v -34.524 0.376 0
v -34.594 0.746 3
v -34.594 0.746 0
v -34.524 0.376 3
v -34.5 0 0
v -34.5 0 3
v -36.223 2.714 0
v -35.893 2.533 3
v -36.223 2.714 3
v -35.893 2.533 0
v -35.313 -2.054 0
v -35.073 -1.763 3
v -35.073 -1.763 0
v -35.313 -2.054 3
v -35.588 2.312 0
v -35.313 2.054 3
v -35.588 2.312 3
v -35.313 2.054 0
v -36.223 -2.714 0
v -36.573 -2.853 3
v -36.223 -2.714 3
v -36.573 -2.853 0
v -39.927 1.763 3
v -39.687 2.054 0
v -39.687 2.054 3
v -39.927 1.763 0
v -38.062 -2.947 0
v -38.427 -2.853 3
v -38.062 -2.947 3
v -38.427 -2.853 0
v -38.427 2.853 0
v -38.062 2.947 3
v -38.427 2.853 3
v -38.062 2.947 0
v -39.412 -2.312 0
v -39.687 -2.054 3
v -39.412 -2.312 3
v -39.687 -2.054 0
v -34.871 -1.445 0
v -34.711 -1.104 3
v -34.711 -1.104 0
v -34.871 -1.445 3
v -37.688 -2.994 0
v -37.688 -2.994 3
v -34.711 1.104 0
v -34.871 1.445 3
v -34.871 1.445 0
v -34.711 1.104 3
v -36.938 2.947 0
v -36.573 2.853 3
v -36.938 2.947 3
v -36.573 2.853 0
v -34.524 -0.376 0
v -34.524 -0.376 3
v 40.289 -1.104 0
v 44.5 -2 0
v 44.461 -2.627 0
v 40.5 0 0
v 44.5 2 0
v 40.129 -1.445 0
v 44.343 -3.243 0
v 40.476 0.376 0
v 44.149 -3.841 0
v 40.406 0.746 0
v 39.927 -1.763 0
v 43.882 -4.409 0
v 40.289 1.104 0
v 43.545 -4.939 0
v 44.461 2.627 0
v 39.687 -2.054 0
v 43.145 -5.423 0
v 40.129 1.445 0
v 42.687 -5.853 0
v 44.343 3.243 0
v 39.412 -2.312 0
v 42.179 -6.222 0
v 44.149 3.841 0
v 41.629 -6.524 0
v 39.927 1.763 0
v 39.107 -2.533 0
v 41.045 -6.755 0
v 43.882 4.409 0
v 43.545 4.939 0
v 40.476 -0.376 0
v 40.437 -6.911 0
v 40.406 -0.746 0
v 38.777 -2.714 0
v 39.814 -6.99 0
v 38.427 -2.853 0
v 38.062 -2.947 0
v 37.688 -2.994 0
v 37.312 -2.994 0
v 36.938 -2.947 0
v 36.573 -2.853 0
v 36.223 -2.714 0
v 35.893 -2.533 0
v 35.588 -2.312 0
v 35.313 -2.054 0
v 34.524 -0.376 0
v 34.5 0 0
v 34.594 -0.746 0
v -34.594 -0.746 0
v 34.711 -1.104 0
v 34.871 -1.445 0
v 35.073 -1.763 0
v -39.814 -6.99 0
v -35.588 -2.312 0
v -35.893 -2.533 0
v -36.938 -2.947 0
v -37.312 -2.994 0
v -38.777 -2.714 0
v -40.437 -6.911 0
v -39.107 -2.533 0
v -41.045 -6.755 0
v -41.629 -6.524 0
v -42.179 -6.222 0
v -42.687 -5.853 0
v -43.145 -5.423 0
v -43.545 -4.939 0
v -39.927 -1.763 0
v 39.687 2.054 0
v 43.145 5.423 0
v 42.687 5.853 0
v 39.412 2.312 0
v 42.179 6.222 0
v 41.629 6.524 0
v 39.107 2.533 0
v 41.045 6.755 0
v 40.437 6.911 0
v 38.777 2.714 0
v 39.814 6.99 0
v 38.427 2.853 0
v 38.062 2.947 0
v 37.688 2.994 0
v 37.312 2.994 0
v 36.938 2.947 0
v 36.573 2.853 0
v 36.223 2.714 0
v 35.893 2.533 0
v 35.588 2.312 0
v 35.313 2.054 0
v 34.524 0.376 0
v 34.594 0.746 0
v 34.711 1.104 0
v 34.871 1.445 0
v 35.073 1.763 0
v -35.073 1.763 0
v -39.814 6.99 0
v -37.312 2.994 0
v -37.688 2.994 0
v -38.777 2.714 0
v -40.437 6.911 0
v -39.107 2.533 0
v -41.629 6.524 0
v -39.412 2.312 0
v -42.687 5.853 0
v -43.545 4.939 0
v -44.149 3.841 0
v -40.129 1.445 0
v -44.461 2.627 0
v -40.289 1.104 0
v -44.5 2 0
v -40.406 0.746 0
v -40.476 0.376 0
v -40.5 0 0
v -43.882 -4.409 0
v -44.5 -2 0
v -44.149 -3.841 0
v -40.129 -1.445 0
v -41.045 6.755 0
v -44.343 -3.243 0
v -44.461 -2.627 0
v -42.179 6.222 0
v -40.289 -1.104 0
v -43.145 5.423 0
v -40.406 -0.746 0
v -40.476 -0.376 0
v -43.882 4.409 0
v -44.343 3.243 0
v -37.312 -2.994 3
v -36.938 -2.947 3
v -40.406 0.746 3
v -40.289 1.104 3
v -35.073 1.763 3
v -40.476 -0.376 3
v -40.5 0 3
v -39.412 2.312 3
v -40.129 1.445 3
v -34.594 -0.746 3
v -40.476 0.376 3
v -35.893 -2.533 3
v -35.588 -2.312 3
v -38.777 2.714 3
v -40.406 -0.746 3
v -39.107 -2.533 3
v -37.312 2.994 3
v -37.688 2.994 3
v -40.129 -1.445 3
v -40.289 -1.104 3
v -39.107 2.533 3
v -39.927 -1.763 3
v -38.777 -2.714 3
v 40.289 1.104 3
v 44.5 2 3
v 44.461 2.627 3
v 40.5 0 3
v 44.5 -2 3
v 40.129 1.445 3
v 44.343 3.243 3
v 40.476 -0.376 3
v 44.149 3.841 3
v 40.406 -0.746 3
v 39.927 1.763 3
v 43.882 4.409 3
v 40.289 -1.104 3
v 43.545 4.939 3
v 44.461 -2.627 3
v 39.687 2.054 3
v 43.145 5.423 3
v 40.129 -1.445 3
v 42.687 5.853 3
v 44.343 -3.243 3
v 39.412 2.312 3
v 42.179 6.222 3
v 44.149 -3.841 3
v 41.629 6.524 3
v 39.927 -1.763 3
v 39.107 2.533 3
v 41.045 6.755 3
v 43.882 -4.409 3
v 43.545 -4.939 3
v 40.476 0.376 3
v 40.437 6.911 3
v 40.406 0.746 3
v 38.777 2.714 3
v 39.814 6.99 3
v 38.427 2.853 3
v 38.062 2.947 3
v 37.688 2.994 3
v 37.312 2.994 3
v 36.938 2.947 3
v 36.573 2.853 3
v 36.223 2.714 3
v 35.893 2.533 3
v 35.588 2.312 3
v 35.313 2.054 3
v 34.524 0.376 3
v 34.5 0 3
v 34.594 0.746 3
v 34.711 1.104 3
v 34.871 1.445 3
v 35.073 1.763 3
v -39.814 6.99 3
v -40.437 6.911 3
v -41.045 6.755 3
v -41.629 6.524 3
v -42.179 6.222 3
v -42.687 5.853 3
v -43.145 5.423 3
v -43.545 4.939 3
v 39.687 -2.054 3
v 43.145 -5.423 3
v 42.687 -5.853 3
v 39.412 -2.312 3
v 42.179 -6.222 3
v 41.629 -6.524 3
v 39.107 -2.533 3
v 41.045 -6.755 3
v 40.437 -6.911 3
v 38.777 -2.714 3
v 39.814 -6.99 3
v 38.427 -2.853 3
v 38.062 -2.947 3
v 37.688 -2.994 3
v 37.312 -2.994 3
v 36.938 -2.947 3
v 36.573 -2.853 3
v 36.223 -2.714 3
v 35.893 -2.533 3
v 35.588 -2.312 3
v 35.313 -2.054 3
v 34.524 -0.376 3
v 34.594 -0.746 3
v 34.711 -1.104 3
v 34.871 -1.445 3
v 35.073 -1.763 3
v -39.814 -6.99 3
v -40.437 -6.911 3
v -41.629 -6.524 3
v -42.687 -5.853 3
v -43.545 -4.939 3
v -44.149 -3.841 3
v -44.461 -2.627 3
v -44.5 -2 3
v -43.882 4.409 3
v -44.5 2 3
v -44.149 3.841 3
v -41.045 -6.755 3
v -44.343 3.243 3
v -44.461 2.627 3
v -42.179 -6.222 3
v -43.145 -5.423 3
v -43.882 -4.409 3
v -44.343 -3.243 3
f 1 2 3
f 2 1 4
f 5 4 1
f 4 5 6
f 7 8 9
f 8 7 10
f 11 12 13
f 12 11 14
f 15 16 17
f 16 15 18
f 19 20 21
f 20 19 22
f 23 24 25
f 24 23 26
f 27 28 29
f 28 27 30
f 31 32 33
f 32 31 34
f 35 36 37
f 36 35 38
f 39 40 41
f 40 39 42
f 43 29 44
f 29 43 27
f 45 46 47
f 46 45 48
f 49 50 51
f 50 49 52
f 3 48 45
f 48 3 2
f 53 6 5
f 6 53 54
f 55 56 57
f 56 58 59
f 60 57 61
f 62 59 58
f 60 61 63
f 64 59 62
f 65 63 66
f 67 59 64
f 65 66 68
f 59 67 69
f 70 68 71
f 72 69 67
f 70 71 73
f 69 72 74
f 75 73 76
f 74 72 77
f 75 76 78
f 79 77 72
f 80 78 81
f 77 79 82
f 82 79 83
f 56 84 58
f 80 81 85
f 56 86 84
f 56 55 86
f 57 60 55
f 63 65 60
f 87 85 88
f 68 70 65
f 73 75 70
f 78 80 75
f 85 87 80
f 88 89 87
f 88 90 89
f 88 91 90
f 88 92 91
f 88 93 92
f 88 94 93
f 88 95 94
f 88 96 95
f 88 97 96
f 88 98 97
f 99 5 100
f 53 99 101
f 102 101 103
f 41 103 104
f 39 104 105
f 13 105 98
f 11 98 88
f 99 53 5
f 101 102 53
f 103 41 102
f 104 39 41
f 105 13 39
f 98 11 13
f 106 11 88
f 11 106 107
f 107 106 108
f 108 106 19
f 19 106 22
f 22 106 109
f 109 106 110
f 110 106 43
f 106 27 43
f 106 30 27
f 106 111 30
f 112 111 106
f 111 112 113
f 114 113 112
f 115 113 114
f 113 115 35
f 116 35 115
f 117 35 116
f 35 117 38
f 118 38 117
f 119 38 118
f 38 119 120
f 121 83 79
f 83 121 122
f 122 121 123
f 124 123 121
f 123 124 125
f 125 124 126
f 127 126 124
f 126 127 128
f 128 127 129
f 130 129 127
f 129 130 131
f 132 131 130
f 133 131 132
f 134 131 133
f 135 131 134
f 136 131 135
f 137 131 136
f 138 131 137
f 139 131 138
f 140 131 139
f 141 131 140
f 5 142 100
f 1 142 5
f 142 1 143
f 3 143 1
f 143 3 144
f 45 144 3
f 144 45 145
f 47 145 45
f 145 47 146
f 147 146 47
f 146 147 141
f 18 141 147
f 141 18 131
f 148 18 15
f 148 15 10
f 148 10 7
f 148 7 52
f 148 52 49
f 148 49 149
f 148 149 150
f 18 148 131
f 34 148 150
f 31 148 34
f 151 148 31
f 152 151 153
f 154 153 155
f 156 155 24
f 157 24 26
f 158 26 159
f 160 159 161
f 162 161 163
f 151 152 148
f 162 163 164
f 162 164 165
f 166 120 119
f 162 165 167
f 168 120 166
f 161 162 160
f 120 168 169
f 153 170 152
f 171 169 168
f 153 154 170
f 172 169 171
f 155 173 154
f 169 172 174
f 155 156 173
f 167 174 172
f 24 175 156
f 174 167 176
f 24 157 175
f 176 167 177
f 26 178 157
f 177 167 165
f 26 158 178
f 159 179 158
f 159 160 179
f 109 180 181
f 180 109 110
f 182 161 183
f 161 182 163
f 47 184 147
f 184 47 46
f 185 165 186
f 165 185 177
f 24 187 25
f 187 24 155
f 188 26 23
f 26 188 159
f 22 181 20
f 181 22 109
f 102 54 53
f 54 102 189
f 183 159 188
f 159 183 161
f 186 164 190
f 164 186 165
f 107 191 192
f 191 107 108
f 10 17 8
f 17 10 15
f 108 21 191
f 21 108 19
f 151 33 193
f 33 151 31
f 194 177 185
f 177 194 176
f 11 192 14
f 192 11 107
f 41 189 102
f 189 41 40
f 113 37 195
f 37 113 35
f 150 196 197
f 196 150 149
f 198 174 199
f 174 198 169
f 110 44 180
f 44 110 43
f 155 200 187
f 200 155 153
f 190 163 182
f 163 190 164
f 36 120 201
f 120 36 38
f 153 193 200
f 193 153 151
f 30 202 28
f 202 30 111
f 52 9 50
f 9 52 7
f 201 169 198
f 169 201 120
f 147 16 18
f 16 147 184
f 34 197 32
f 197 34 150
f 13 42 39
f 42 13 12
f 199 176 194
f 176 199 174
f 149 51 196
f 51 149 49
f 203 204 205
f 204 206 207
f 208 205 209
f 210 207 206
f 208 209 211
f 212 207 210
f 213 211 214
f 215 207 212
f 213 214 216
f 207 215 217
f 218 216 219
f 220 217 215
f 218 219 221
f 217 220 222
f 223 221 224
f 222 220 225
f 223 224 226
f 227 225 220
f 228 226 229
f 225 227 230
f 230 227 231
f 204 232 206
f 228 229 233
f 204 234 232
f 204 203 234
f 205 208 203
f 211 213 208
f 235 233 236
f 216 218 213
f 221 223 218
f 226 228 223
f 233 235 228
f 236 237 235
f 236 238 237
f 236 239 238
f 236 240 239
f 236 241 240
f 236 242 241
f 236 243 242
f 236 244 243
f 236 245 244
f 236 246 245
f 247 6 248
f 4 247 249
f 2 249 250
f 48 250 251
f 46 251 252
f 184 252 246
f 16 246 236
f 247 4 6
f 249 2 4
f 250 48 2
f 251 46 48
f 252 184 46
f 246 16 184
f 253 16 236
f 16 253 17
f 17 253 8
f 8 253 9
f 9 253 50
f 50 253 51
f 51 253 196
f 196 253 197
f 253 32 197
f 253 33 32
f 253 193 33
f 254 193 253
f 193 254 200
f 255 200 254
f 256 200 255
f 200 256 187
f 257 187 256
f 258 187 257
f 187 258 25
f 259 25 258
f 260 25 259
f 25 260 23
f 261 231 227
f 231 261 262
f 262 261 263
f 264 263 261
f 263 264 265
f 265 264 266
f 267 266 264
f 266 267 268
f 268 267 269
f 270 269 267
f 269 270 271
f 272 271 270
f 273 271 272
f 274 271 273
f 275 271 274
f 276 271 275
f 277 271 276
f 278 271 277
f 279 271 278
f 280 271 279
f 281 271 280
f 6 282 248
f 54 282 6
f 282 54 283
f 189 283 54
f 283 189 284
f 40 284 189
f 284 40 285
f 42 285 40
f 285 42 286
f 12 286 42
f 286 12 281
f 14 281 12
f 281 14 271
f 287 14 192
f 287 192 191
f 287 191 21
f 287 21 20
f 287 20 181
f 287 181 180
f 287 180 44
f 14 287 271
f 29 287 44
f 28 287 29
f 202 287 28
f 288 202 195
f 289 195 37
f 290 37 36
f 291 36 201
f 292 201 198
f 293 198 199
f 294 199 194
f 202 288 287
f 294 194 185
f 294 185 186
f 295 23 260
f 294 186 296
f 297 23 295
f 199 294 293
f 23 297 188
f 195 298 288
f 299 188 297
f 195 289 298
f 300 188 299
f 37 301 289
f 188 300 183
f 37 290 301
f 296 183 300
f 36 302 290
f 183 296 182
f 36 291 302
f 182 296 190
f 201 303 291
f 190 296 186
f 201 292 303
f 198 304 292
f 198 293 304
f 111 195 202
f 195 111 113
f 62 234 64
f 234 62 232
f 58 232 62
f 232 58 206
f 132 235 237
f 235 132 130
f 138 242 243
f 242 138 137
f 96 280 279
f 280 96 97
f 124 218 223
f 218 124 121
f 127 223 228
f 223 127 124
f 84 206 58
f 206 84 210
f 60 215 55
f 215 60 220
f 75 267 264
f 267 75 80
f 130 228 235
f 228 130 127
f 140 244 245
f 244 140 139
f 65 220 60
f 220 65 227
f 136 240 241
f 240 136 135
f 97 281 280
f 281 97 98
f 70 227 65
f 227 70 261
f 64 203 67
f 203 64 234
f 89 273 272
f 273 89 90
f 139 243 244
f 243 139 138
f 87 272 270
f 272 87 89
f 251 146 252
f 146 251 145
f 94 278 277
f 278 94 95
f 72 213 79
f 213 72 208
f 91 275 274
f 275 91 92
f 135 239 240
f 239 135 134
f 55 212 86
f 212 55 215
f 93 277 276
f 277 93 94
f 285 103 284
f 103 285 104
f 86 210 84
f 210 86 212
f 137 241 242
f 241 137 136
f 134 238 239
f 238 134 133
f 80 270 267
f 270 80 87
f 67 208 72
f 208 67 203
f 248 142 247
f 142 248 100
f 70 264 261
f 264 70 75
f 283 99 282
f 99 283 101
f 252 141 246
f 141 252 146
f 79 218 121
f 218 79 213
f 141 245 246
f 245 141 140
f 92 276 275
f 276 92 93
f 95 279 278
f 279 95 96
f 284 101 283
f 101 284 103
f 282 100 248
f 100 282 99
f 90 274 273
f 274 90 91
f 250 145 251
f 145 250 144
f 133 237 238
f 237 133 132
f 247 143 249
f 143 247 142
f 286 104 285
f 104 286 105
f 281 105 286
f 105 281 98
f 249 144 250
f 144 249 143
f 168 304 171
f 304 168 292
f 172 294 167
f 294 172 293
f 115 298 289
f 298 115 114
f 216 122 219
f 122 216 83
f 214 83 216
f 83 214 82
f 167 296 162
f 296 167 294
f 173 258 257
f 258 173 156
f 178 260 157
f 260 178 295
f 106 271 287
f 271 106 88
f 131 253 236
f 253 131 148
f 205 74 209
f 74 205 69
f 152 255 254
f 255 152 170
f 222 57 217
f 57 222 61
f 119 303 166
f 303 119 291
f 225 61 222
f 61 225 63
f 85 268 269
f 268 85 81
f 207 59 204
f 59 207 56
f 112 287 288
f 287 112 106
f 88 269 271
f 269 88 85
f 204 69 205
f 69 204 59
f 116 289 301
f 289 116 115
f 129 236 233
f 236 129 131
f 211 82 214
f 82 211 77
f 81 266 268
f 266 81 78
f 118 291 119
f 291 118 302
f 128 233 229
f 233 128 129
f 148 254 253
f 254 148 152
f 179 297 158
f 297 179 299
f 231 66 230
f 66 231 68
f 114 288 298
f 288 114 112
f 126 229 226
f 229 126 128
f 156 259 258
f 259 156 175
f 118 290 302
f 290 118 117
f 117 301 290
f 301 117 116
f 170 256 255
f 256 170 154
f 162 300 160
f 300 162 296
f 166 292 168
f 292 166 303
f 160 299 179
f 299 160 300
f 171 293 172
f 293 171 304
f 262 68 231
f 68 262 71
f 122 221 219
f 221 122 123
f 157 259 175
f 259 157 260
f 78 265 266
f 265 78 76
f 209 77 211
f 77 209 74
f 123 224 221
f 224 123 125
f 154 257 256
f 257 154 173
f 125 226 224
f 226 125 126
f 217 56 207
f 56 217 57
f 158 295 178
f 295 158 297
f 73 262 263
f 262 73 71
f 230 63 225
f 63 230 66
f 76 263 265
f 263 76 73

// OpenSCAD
$fn = 50;


difference() {
	union() {
		hull() {
			translate(v = [-39.5000000000, 2.0000000000, 0]) {
				cylinder(h = 3, r = 5);
			}
			translate(v = [39.5000000000, 2.0000000000, 0]) {
				cylinder(h = 3, r = 5);
			}
			translate(v = [-39.5000000000, -2.0000000000, 0]) {
				cylinder(h = 3, r = 5);
			}
			translate(v = [39.5000000000, -2.0000000000, 0]) {
				cylinder(h = 3, r = 5);
			}
		}
	}
	union() {
		translate(v = [-37.5000000000, 0.0000000000, 0]) {
			cylinder(h = 3, r = 3.0000000000);
		}
		translate(v = [37.5000000000, 0.0000000000, 0]) {
			cylinder(h = 3, r = 3.0000000000);
		}
		translate(v = [-37.5000000000, 0.0000000000, 0]) {
			cylinder(h = 3, r = 1.5000000000);
		}
		translate(v = [37.5000000000, 0.0000000000, 0]) {
			cylinder(h = 3, r = 1.5000000000);
		}
		translate(v = [-37.5000000000, 0.0000000000, 0]) {
			cylinder(h = 3, r = 1.5000000000);
		}
		translate(v = [37.5000000000, 0.0000000000, 0]) {
			cylinder(h = 3, r = 1.5000000000);
		}
		translate(v = [-37.5000000000, 0.0000000000, 0]) {
			cylinder(h = 3, r = 1.5000000000);
		}
		translate(v = [37.5000000000, 0.0000000000, 0]) {
			cylinder(h = 3, r = 1.5000000000);
		}
	}
}
